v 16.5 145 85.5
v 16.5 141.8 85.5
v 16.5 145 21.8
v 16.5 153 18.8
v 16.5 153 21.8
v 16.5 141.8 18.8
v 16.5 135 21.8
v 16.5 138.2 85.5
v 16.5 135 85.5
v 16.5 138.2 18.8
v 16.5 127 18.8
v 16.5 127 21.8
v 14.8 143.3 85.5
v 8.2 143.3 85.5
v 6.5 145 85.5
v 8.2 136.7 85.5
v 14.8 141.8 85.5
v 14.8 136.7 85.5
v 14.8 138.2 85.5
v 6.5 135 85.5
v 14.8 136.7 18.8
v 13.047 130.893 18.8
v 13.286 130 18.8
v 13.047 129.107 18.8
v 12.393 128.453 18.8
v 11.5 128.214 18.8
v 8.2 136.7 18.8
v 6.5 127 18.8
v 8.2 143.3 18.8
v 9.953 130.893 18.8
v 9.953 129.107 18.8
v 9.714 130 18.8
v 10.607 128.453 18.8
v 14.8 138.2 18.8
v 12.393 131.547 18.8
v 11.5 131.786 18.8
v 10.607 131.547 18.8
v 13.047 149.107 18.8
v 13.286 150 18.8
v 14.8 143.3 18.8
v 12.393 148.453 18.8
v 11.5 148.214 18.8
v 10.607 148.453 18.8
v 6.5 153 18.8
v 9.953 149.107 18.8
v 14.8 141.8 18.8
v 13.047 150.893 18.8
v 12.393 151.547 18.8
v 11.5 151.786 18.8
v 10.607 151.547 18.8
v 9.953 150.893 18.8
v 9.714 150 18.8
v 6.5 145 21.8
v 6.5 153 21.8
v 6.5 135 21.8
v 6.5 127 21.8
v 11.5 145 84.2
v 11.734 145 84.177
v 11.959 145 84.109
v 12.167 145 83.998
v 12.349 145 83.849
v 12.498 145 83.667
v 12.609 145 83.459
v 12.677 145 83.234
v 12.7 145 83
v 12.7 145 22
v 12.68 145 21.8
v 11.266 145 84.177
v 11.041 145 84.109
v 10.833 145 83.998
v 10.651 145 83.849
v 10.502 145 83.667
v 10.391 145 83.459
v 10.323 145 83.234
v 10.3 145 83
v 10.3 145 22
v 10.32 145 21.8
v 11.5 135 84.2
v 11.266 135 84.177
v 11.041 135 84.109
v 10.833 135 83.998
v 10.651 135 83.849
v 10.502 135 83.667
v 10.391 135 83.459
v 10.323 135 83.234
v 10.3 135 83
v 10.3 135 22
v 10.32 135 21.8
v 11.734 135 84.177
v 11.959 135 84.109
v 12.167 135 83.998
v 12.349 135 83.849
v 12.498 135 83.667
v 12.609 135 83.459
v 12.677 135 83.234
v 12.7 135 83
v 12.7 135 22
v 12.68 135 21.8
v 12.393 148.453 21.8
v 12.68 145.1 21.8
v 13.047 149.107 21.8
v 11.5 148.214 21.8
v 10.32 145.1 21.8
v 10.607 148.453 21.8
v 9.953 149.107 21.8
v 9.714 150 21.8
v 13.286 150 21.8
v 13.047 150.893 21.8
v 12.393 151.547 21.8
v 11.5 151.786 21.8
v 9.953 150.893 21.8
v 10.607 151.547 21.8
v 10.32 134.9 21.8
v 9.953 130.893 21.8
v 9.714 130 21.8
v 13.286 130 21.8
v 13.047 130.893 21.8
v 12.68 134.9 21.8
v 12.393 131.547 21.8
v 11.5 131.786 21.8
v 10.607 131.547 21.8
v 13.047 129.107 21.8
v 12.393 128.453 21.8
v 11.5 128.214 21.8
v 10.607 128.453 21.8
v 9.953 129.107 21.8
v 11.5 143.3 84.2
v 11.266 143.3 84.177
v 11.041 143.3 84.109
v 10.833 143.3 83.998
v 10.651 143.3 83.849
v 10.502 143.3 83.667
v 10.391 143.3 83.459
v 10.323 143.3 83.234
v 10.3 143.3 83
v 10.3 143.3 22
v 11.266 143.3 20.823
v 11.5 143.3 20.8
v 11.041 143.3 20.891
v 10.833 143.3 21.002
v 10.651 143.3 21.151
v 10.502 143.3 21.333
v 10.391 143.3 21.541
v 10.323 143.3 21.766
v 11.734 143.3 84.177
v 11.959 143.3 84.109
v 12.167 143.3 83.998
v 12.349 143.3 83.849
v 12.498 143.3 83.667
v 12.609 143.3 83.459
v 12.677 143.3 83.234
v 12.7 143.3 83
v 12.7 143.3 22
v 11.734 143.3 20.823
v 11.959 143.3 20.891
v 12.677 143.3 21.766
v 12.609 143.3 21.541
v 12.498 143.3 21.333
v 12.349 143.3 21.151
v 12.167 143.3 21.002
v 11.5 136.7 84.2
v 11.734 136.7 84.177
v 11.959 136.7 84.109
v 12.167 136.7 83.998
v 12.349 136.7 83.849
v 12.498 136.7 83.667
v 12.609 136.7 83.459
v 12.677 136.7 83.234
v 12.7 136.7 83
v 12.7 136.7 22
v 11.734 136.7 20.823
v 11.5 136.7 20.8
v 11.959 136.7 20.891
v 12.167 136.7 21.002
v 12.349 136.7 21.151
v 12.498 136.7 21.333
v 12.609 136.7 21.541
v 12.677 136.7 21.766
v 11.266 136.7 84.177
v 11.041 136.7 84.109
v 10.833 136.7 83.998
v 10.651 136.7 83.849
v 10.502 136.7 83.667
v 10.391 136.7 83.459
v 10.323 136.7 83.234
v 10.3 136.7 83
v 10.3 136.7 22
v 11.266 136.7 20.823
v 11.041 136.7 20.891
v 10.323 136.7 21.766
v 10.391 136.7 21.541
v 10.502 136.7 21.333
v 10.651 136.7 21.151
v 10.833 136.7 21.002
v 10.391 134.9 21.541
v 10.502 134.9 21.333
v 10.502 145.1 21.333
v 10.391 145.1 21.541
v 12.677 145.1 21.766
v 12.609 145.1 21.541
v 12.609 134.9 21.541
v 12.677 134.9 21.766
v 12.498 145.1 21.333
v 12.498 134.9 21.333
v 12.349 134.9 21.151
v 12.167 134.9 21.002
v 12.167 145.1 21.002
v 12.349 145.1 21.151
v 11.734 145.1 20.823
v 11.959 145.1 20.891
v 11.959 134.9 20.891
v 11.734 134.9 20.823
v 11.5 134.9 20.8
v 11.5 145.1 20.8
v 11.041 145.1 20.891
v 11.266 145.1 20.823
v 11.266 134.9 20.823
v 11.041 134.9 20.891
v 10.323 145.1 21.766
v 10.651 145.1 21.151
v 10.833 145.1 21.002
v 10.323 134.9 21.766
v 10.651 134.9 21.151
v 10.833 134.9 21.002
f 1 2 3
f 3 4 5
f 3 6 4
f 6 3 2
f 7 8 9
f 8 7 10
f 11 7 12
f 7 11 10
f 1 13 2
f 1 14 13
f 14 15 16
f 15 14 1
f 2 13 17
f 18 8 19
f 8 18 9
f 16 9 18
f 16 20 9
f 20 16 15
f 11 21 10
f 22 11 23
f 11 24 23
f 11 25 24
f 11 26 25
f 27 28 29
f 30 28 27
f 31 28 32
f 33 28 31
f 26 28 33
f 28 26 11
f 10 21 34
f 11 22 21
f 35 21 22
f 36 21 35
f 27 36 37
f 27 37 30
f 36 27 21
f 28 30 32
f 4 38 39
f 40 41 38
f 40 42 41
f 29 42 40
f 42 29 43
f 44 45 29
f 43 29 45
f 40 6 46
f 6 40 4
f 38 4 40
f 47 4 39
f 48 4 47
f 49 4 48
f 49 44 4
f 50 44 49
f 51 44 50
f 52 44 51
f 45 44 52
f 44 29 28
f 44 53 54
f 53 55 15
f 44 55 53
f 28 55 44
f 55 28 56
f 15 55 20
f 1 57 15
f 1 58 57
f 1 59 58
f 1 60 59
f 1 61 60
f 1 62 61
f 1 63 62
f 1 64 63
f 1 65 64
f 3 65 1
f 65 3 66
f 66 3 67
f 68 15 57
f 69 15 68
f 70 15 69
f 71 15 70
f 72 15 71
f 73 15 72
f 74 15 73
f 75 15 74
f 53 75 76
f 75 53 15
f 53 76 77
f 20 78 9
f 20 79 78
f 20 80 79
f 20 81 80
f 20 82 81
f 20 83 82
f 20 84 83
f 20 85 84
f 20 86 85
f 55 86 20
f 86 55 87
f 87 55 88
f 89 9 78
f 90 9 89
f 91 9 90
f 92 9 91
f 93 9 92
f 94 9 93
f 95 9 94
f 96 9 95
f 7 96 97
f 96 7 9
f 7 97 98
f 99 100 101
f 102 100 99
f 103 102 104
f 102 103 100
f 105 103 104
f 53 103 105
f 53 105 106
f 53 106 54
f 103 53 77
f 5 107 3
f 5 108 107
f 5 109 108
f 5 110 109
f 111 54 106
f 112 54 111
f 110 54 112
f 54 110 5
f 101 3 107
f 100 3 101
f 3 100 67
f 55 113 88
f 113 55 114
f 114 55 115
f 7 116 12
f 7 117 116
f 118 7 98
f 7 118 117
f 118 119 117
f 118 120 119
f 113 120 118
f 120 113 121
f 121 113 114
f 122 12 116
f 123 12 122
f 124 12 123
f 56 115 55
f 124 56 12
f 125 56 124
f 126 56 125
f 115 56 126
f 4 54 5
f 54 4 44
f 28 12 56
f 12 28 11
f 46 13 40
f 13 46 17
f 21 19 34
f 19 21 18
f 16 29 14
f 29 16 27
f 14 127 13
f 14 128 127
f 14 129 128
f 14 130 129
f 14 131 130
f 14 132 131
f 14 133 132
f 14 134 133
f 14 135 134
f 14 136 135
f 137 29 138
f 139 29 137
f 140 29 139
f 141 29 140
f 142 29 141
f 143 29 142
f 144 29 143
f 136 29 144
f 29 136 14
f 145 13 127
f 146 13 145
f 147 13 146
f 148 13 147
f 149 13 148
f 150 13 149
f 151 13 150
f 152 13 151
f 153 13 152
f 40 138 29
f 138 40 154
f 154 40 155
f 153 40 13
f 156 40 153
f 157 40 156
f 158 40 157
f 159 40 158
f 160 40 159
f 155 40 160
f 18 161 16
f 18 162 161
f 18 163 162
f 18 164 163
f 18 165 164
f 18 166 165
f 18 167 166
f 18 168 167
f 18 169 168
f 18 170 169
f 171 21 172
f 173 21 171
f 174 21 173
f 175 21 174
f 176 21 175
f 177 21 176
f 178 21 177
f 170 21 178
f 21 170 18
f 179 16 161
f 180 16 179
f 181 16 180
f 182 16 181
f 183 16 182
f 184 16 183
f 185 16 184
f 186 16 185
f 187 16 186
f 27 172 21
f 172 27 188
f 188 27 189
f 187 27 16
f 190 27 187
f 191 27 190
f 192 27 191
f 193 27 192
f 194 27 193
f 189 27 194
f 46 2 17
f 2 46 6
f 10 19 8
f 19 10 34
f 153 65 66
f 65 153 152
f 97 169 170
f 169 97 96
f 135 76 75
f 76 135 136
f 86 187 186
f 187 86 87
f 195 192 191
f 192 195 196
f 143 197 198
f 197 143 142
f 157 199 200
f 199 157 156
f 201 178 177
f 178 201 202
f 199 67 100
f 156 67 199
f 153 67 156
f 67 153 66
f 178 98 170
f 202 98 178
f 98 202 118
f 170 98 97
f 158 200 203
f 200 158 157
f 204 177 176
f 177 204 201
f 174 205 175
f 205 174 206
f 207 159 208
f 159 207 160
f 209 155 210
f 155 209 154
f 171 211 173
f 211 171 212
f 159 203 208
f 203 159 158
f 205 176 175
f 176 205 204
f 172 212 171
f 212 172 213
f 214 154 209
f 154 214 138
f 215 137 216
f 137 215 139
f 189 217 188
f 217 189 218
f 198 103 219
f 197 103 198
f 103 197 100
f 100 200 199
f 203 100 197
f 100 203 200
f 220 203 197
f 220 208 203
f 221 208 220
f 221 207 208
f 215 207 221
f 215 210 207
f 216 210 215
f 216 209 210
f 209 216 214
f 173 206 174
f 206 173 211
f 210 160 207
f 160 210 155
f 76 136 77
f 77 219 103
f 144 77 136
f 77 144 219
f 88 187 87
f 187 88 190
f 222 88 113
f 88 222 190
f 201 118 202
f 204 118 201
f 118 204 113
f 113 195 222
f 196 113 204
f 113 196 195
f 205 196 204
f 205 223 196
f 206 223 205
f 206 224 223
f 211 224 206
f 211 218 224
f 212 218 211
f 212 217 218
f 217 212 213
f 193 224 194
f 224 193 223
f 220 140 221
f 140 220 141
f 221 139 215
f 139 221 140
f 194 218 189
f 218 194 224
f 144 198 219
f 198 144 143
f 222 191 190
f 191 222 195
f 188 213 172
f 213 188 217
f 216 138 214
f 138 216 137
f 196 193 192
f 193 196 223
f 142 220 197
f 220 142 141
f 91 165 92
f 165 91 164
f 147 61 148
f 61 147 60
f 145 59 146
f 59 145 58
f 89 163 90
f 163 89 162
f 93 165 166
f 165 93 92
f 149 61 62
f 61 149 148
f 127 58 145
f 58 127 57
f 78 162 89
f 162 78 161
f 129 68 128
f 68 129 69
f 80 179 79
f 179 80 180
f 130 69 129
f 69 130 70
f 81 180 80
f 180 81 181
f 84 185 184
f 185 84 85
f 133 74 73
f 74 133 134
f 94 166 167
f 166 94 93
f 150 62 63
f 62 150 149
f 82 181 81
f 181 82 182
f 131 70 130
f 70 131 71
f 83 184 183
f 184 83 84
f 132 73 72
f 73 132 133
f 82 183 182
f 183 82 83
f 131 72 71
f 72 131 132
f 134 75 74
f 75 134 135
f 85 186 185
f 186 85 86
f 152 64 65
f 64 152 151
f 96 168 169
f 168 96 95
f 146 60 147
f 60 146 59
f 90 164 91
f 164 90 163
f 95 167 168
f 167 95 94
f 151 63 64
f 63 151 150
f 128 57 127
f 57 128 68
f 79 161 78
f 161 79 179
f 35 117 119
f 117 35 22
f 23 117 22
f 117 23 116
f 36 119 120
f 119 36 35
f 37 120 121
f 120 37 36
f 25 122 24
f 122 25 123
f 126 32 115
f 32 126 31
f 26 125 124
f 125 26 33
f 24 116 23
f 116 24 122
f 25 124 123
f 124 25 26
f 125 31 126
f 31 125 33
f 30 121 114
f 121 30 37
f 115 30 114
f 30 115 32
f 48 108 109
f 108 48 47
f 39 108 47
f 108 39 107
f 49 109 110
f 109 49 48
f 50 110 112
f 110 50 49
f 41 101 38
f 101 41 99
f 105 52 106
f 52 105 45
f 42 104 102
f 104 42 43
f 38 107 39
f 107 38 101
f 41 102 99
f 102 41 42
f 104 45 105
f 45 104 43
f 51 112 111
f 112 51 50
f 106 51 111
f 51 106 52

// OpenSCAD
// Generated from the same CSG operations as STEP. Rebuild with spec/build_parent_hand_service.py.
difference(){difference(){difference(){difference(){difference(){difference(){difference(){union(){translate([6.5,135,18.8]) cube([10,10,66.7]);translate([6.5,127,18.8]) cube([10,26,3]);}translate([8.2,136.7,18.7]) cube([6.6,6.6,66.9]);}translate([11.5,138.2,18.7]) cube([5.1,3.6,67]);}translate([10.3,134.9,22]) cube([2.4,10.2,61]);}translate([11.5,134.9,22]) rotate([-90,0,0]) cylinder(r=1.2,h=10.2,$fn=32);}translate([11.5,134.9,83]) rotate([-90,0,0]) cylinder(r=1.2,h=10.2,$fn=32);}translate([11.5,130,18.7]) cylinder(r=1.7858514112073933,h=3.2,$fn=12);}translate([11.5,150,18.7]) cylinder(r=1.7858514112073933,h=3.2,$fn=12);}
